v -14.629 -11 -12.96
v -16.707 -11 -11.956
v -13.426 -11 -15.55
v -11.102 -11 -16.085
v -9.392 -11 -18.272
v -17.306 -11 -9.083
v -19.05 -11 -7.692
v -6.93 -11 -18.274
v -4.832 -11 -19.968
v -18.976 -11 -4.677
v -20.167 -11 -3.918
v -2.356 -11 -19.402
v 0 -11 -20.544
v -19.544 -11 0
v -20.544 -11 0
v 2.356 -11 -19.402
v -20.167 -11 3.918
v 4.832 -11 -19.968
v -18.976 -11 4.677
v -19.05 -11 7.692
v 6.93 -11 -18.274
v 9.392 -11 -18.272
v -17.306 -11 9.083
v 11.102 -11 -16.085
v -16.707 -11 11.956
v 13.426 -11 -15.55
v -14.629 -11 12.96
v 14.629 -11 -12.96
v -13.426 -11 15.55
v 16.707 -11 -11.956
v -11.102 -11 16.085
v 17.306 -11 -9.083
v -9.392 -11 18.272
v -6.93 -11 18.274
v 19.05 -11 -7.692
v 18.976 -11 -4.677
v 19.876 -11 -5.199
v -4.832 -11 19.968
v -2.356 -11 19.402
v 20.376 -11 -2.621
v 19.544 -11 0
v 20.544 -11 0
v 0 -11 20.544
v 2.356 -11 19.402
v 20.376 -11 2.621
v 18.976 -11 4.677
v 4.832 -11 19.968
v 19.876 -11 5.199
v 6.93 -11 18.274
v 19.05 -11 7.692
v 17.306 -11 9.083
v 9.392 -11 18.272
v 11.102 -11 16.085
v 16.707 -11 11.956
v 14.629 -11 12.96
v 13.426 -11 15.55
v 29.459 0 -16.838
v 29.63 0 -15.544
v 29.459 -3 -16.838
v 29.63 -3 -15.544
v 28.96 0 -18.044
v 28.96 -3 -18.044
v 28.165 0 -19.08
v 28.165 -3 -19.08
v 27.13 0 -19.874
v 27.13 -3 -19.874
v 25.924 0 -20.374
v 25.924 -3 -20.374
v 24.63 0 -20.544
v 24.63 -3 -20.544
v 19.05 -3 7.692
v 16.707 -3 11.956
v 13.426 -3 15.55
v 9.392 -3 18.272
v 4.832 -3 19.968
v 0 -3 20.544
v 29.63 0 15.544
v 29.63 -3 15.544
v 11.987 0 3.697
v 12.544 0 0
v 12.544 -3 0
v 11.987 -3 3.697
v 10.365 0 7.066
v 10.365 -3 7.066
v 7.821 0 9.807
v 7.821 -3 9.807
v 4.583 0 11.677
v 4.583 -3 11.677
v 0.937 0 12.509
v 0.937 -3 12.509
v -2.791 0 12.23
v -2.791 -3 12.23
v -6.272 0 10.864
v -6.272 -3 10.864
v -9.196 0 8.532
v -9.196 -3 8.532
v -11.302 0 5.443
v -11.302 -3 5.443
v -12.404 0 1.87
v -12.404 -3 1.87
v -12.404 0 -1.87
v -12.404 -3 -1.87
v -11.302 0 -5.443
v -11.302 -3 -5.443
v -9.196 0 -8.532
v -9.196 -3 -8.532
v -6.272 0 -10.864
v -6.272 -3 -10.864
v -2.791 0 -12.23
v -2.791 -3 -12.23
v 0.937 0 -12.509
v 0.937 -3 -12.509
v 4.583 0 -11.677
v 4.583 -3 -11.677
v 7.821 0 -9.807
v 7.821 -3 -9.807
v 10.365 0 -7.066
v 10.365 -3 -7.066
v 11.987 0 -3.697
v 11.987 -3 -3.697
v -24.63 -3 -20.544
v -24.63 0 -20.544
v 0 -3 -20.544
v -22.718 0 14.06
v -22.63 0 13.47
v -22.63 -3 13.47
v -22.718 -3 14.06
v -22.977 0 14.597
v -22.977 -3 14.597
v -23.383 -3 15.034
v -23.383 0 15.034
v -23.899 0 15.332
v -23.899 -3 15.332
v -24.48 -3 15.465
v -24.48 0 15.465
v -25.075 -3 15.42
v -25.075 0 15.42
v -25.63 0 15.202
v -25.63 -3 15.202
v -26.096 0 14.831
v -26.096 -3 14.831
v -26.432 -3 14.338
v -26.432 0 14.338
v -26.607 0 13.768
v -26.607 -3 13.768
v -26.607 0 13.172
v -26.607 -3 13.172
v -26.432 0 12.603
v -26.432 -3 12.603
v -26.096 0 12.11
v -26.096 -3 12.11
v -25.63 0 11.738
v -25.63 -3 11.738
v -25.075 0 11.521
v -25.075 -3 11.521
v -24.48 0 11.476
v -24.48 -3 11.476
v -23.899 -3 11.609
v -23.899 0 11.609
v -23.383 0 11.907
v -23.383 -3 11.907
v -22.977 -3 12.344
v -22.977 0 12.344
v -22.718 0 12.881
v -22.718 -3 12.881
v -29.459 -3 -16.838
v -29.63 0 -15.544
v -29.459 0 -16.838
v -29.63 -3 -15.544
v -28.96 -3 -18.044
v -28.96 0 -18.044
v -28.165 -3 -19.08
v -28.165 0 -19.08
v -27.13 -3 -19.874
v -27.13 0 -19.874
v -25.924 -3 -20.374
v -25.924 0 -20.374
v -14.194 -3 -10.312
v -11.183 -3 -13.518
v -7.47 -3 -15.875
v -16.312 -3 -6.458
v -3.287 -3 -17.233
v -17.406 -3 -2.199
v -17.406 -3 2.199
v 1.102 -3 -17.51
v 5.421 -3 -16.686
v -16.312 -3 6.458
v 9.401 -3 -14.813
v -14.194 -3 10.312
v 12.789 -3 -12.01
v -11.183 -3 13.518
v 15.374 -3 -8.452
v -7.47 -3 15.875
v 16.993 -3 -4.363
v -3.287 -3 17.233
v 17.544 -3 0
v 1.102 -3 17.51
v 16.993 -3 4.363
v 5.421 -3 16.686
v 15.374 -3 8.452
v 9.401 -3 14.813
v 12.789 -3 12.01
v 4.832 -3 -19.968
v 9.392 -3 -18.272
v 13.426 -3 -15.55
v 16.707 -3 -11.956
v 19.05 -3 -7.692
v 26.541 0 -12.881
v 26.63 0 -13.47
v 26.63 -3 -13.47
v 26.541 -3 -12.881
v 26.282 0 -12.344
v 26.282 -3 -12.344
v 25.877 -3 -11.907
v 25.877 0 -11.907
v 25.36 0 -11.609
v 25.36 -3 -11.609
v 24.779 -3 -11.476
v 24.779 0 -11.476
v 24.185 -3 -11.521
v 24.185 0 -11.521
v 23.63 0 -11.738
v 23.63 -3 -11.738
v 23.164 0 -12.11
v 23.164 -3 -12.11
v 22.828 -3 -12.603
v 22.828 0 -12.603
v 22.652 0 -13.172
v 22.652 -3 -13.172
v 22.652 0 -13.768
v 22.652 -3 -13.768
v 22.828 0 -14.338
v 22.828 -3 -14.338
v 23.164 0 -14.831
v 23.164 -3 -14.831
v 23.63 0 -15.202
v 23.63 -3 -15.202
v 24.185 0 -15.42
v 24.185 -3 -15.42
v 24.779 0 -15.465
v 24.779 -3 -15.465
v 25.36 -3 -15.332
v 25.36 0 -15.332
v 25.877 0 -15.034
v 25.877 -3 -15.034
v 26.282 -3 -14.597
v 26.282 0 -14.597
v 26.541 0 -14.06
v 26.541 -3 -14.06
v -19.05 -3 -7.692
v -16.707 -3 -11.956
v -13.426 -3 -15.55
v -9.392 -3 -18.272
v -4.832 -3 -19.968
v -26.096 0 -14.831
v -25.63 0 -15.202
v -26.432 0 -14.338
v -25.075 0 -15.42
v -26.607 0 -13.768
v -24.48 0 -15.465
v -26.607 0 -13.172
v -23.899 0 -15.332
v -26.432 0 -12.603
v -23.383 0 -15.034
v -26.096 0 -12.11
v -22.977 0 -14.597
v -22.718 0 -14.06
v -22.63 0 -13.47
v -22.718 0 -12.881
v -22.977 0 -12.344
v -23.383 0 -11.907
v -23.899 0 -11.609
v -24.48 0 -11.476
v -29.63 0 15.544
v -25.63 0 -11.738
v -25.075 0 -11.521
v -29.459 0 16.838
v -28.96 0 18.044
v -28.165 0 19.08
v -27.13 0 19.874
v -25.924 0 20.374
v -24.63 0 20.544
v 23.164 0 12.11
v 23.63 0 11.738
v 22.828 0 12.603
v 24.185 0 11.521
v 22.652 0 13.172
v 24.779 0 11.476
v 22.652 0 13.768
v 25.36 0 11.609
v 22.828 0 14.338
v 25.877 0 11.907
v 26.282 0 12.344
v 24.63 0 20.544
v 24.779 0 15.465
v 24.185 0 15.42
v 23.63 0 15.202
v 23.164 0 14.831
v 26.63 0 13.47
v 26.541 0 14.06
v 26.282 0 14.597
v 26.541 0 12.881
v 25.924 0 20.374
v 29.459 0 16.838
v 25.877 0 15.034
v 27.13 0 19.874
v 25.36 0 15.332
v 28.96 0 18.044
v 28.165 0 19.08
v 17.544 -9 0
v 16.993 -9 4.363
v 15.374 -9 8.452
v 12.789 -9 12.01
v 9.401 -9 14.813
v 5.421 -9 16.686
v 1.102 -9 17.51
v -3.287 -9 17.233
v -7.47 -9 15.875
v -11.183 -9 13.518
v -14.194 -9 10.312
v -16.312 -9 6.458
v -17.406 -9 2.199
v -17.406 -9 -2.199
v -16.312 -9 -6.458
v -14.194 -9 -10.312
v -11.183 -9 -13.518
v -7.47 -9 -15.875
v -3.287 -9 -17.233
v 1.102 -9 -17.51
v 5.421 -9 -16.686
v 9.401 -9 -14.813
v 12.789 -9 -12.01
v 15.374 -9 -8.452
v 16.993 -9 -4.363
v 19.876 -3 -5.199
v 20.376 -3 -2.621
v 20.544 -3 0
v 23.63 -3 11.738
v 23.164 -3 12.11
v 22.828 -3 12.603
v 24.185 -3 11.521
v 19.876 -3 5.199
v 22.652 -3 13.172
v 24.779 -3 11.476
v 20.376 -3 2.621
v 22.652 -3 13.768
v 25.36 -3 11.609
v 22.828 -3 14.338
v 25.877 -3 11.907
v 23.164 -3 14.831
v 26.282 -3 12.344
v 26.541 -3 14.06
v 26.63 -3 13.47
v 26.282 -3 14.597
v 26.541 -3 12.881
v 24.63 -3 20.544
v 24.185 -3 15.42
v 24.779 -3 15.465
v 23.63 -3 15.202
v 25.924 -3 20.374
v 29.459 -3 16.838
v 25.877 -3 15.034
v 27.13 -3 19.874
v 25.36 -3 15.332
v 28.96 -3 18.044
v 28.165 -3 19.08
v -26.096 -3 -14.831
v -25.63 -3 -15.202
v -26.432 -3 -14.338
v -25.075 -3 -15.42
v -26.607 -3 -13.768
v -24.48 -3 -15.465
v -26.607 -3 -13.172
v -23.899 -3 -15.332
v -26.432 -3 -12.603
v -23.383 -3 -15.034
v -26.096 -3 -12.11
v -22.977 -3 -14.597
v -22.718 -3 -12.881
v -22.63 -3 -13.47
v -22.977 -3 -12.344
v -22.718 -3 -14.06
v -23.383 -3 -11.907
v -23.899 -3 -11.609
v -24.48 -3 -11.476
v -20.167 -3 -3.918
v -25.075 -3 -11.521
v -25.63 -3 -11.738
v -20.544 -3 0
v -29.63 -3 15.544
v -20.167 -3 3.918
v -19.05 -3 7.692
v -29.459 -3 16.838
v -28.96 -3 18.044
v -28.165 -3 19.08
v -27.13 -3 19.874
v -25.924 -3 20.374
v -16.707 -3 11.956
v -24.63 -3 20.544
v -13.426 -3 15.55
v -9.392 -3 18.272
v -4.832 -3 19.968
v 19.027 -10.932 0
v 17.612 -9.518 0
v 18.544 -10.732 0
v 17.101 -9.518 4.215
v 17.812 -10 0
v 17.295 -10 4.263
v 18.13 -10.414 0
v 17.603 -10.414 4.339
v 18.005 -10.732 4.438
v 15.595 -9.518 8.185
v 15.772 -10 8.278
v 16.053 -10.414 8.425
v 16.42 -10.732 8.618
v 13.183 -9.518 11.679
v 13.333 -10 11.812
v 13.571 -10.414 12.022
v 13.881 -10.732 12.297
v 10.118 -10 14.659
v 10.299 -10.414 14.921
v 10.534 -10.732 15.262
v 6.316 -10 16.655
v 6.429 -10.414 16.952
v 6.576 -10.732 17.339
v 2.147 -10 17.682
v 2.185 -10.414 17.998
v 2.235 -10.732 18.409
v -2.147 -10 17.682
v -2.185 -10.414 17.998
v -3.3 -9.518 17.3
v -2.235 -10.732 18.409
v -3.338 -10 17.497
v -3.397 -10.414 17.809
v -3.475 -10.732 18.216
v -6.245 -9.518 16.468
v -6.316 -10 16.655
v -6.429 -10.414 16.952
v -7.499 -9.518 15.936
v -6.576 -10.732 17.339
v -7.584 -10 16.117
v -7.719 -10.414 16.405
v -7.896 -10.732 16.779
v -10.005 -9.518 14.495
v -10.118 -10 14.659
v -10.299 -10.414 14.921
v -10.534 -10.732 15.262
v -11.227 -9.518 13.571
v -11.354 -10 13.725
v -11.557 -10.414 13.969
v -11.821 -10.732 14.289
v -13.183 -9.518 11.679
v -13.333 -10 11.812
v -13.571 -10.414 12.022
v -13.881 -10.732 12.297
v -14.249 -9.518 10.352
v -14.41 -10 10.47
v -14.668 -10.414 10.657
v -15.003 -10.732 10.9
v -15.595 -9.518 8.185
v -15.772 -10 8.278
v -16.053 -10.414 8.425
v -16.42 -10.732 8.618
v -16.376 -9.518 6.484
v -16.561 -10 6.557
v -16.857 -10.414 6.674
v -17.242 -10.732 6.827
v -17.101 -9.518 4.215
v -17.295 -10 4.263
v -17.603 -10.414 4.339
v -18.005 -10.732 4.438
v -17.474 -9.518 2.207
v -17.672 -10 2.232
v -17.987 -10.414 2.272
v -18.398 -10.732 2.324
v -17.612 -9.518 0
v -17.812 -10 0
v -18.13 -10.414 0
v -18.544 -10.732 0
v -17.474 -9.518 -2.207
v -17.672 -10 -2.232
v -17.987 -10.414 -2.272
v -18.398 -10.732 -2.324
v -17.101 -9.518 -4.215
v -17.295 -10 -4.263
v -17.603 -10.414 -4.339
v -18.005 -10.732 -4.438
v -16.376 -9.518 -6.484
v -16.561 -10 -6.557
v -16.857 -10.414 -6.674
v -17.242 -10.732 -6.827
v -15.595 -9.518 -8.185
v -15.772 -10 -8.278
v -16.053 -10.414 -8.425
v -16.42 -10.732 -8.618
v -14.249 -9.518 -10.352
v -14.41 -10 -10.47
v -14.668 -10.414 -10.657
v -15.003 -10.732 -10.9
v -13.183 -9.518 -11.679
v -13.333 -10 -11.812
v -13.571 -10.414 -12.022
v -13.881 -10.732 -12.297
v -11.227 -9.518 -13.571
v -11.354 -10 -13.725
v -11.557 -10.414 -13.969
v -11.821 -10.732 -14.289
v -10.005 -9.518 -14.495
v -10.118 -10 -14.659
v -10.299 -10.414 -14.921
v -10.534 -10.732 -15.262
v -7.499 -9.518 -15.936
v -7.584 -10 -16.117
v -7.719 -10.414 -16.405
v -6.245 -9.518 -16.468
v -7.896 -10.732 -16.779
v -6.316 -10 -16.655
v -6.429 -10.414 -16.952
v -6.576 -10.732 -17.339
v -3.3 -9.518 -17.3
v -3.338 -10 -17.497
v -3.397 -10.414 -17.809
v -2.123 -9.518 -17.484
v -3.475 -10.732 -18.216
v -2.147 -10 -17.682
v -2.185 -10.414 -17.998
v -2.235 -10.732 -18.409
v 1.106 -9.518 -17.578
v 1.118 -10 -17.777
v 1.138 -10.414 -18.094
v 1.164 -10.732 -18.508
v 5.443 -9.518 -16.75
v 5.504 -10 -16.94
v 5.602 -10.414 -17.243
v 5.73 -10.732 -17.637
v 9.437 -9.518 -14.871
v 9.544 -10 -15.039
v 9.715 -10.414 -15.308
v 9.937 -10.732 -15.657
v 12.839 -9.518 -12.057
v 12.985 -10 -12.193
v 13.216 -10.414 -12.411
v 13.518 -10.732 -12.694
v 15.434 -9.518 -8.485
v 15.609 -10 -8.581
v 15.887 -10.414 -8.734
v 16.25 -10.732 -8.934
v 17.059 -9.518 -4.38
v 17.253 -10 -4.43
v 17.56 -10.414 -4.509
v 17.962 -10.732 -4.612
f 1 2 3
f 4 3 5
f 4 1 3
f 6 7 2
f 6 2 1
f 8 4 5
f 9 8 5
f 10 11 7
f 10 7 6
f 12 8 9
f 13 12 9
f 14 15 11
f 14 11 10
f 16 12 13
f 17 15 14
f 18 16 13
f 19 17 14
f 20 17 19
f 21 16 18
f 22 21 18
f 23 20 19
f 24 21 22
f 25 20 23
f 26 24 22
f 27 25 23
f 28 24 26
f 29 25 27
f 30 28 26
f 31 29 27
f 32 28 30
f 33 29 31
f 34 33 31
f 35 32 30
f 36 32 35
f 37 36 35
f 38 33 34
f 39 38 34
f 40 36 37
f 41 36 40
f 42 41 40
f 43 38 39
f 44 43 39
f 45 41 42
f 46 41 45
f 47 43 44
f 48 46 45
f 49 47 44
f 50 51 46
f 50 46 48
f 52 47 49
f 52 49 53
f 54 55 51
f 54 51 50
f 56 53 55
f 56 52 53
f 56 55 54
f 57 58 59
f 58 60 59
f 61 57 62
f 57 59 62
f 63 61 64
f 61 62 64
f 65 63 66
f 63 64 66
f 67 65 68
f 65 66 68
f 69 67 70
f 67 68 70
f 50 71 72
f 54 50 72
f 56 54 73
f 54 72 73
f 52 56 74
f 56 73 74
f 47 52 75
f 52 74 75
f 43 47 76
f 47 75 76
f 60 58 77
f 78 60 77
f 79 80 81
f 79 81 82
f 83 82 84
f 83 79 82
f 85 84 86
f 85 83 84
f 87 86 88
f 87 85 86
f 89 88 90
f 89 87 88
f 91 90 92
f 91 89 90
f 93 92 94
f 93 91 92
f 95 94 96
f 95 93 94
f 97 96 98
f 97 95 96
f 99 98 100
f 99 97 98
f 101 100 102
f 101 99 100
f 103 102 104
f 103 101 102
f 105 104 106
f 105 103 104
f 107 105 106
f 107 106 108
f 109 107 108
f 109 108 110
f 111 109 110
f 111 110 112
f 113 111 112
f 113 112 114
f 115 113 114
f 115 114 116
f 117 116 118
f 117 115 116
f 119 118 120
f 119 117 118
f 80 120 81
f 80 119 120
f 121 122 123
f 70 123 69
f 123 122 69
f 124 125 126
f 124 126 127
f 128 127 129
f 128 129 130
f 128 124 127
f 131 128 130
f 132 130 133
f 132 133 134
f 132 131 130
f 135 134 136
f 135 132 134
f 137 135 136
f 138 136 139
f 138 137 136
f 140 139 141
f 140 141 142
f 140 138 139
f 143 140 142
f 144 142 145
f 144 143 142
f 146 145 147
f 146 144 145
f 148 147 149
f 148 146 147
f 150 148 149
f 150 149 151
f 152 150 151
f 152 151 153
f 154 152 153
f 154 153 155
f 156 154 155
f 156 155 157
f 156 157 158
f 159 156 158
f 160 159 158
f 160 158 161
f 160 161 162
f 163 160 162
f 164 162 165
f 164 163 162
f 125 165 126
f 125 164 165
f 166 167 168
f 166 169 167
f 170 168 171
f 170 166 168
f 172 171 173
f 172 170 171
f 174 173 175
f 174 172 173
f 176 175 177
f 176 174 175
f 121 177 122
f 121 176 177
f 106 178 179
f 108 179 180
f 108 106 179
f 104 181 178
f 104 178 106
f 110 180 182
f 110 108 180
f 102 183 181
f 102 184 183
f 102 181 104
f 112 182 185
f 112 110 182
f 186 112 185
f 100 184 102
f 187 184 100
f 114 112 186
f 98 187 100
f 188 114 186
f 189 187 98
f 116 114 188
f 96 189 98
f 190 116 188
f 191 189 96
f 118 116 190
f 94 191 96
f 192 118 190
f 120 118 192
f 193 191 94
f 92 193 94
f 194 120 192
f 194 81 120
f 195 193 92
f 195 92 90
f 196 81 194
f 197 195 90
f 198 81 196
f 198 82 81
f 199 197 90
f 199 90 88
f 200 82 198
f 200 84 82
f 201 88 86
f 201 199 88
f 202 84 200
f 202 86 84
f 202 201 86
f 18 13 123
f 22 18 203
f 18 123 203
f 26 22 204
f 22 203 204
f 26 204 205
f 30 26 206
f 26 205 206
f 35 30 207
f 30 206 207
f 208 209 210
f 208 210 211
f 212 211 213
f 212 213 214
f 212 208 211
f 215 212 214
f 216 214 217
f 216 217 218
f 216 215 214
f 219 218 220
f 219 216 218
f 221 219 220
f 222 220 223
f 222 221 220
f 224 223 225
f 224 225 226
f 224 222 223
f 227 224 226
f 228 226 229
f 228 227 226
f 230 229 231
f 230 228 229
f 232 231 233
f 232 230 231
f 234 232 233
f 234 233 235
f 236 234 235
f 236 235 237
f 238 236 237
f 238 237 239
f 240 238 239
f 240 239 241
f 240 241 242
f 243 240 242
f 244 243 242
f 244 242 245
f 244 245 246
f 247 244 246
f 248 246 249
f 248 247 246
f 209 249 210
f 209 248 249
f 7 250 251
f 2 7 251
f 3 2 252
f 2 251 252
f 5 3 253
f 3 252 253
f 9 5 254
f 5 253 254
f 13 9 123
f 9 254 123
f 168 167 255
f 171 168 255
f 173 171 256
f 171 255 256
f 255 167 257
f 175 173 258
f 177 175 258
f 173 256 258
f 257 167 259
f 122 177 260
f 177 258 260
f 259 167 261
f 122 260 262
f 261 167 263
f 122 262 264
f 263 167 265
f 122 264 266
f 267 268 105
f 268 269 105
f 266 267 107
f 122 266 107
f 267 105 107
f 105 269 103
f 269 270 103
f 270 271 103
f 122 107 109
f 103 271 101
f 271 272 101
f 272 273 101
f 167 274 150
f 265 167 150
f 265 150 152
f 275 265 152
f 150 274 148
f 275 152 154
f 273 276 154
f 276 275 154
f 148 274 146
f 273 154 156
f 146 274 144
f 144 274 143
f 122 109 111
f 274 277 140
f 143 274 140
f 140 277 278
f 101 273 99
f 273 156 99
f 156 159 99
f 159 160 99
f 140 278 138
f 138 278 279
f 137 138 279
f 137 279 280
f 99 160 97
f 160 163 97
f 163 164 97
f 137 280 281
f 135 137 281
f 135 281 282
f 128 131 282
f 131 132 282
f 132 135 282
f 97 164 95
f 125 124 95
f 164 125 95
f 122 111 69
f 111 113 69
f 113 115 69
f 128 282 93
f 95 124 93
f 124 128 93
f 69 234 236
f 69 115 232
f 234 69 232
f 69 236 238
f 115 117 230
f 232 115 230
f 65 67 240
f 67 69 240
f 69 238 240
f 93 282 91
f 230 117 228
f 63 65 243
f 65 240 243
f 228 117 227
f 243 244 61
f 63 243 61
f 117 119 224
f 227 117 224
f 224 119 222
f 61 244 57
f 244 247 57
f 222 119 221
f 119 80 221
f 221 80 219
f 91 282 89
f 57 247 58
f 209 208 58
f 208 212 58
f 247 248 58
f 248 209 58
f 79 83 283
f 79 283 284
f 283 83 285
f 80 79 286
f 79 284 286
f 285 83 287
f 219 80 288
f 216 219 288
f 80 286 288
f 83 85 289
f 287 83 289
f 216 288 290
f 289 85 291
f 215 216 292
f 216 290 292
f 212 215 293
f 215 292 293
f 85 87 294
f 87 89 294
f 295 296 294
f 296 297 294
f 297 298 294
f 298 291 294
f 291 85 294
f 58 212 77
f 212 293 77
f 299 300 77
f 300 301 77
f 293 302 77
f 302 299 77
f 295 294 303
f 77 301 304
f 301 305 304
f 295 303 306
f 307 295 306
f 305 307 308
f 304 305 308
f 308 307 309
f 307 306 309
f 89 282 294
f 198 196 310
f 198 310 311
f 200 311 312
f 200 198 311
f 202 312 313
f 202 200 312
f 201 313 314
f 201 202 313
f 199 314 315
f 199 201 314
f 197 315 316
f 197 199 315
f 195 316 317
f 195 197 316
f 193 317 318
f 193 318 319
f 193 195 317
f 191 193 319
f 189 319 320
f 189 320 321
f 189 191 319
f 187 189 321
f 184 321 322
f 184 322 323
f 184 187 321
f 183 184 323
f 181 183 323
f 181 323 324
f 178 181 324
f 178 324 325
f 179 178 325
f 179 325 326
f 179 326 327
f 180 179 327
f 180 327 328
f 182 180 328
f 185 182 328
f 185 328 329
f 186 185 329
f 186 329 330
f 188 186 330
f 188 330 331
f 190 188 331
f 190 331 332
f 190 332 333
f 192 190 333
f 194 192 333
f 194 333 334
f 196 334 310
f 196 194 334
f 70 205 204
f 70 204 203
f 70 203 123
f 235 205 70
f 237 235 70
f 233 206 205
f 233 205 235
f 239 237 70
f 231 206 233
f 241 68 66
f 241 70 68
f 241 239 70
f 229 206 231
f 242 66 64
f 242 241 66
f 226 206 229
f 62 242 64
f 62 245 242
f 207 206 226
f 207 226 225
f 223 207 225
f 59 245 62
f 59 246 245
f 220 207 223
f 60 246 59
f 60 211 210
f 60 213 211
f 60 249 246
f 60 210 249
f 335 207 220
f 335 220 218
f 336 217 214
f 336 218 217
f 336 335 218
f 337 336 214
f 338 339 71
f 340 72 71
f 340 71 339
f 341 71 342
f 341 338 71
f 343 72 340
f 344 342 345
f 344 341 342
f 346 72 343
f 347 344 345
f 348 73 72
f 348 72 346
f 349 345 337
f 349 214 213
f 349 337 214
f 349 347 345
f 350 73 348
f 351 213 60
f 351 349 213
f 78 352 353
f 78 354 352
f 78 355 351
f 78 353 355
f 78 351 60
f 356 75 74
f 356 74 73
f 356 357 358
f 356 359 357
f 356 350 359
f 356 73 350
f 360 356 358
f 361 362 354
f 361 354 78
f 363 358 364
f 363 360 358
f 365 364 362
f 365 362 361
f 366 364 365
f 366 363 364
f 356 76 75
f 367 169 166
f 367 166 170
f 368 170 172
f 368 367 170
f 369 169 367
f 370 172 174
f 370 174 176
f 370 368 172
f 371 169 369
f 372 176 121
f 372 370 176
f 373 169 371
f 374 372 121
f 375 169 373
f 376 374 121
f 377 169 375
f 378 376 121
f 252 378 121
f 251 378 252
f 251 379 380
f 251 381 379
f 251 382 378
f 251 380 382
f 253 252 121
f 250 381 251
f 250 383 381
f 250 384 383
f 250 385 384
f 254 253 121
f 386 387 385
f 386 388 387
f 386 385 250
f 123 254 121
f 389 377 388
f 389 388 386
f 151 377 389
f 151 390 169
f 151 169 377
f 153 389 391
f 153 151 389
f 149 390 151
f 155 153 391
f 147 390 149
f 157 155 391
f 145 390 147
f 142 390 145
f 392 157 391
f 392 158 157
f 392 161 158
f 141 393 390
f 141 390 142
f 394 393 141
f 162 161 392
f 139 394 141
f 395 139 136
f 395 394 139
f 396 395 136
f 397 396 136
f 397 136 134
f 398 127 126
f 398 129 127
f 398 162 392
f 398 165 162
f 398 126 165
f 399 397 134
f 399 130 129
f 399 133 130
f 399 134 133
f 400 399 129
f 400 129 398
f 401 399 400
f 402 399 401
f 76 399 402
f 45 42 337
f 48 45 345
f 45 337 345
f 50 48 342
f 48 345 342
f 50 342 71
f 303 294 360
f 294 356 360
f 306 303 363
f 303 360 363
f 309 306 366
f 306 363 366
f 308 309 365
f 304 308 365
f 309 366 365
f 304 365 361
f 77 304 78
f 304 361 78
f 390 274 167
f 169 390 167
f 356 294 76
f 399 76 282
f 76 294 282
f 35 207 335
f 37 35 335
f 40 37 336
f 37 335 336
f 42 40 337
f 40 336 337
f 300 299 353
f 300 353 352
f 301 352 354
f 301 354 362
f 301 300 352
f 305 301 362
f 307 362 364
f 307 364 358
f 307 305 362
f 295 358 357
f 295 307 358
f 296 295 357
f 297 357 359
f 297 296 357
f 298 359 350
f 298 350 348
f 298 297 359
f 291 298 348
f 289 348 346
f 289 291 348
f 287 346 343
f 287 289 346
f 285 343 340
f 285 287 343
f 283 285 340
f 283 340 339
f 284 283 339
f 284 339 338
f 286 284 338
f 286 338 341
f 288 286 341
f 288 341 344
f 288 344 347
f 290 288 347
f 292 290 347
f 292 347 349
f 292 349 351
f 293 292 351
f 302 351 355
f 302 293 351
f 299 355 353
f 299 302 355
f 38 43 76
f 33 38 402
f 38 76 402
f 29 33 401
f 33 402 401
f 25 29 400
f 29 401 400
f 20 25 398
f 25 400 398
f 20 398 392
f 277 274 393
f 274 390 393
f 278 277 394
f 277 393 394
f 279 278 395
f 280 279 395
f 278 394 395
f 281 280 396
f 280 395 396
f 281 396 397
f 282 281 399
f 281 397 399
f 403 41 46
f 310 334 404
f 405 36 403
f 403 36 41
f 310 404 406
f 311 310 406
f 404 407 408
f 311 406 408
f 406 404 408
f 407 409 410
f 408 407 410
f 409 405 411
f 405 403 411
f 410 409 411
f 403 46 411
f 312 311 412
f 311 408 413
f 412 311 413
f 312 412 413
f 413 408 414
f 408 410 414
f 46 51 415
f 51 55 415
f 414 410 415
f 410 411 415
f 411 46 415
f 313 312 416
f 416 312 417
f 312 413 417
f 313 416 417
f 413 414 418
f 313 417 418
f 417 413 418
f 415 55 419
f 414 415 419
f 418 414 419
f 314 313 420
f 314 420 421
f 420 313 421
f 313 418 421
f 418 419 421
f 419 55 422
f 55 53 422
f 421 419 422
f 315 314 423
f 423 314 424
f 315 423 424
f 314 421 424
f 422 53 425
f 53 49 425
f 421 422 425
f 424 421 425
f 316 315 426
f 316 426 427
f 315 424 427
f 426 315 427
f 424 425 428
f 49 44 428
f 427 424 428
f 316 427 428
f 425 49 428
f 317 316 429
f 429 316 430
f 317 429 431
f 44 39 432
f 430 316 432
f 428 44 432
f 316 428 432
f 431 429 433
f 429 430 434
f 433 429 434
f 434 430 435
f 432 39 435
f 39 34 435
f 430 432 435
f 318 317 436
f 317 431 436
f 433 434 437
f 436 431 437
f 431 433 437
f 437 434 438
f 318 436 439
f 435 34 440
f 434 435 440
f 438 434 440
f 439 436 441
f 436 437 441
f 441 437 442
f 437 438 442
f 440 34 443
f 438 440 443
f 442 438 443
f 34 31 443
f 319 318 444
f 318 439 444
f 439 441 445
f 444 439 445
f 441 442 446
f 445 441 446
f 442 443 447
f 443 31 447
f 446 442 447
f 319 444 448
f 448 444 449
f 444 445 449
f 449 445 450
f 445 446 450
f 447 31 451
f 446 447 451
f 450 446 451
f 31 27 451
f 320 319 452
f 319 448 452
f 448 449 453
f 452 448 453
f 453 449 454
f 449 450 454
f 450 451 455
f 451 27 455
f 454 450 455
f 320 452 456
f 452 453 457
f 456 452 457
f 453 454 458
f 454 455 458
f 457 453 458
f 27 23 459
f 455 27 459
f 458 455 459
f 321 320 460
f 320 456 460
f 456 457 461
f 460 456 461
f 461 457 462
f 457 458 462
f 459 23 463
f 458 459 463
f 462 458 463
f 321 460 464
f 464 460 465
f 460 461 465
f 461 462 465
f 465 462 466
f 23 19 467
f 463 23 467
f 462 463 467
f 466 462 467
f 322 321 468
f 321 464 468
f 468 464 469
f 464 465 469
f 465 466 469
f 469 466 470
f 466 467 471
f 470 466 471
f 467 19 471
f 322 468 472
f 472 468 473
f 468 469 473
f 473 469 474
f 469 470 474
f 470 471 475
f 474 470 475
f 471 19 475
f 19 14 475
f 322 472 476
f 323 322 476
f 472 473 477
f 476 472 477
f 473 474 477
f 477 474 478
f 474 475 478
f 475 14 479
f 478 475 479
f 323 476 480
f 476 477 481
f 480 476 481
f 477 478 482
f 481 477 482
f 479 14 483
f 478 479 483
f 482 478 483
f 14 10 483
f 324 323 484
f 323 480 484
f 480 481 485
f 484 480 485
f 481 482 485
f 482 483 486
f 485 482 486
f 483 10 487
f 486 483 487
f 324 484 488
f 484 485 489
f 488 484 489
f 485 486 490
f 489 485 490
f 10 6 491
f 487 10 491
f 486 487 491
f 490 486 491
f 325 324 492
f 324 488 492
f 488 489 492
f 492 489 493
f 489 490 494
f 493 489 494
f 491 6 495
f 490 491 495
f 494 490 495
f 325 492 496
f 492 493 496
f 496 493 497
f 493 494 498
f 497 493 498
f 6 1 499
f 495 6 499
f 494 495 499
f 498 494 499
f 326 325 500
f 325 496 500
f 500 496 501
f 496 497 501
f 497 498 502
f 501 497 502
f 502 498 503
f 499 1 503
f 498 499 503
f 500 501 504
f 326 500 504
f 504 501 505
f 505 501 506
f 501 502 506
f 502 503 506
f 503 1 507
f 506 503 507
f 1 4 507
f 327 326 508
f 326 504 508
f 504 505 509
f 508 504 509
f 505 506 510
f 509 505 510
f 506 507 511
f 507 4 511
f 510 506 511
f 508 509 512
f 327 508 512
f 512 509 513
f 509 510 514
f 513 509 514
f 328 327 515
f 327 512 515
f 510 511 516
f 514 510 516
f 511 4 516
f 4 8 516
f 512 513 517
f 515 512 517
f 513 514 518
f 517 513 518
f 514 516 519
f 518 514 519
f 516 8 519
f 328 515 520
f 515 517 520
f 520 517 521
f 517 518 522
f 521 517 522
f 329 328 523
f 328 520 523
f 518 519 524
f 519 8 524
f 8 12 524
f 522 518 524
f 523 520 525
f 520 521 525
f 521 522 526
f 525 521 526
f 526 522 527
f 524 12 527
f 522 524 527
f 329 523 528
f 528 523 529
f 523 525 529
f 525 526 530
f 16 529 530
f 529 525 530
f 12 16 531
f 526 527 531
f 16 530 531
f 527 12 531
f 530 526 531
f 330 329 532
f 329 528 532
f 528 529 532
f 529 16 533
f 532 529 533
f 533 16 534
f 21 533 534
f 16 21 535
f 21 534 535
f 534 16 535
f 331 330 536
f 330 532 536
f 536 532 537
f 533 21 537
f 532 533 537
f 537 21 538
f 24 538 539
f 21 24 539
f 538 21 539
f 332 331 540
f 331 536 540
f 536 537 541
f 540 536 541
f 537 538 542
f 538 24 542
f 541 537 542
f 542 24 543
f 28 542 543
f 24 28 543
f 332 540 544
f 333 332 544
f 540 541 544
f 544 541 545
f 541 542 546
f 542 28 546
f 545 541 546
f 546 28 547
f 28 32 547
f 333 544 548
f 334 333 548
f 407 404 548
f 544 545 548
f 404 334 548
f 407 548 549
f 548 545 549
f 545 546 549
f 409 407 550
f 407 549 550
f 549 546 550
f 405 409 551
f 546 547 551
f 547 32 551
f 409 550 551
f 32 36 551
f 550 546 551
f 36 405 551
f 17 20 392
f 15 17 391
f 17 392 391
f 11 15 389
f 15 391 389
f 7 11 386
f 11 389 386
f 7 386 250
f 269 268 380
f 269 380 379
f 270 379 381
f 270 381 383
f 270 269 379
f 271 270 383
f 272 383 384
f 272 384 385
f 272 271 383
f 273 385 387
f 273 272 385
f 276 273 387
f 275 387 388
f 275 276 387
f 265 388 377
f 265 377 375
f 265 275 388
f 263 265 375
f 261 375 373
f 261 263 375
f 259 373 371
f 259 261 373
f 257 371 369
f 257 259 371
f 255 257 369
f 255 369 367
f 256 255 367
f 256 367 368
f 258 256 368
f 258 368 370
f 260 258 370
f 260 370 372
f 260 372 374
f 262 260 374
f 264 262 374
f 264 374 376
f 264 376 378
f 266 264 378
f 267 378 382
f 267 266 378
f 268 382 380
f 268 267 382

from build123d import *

# Parameters (mm, degrees)
F0_R     = 17.54425
F0_R_2   = 2
F1_DEPTH = 3
F0_R_3   = 12.54425
F2_DEPTH = 3
F3_DEPTH = 11
F4_R     = 5
F5_R     = 2


with BuildPart() as f1:
    # F0 (on Front) → F1 (new body)
    with BuildSketch(Plane.XZ):
        with BuildLine():
            ThreePointArc((19.05, 7.6917948531), (11.4900838041, 17.0306835517), (0, 20.54425))
            ThreePointArc((0, 20.54425), (-11.4900838041, 17.0306835517), (-19.05, 7.6917948531))
            Line((-19.05, 7.6917948531), (-19.05, -7.6917948531))
            ThreePointArc((-19.05, -7.6917948531), (-11.4900838386, -17.0306835284), (-8.31e-08, -20.54425))
            ThreePointArc((-8.31e-08, -20.54425), (11.4900837697, -17.0306835749), (19.05, -7.6917948531))
            Line((19.05, -7.6917948531), (19.05, 7.6917948531))
        make_face()
        Circle(F0_R, mode=Mode.SUBTRACT)
        with BuildLine():
            Line((29.6296158184, 20.54425), (19.05, 20.54425))
            Line((19.05, 20.54425), (19.05, 7.6917948531))
            ThreePointArc((19.05, 7.6917948531), (20.1672280019, 3.9177956533), (20.54425, 0))
            ThreePointArc((20.54425, 0), (20.1672280019, -3.9177956533), (19.05, -7.6917948531))
            Line((19.05, -7.6917948531), (19.05, -20.54425))
            Line((19.05, -20.54425), (29.6296158184, -20.54425))
            Line((29.6296158184, -20.54425), (29.6296158184, 20.54425))
        make_face()
        with Locations((24.6296158184, -13.4703841816)):
            Circle(F0_R_2, mode=Mode.SUBTRACT)
        with Locations((24.6296158184, 13.4703841816)):
            Circle(F0_R_2, mode=Mode.SUBTRACT)
        with BuildLine():
            Line((-19.05, 7.6917948531), (-19.05, 20.54425))
            Line((-19.05, 20.54425), (-29.6296158184, 20.54425))
            Line((-29.6296158184, 20.54425), (-29.6296158184, -20.54425))
            Line((-29.6296158184, -20.54425), (-19.05, -20.54425))
            Line((-19.05, -20.54425), (-19.05, -7.6917948531))
            ThreePointArc((-19.05, -7.6917948531), (-20.54425, 0), (-19.05, 7.6917948531))
        make_face()
        with Locations((-24.6296158184, -13.4703841816)):
            Circle(F0_R_2, mode=Mode.SUBTRACT)
        with Locations((-24.6296158184, 13.4703841816)):
            Circle(F0_R_2, mode=Mode.SUBTRACT)
        with BuildLine():
            Line((0, 20.54425), (-19.05, 20.54425))
            Line((-19.05, 20.54425), (-19.05, 7.6917948531))
            ThreePointArc((-19.05, 7.6917948531), (-11.4900838041, 17.0306835517), (0, 20.54425))
        make_face()
        with BuildLine():
            Line((-19.05, -7.6917948531), (-19.05, 7.6917948531))
            ThreePointArc((-19.05, 7.6917948531), (-20.54425, 0), (-19.05, -7.6917948531))
        make_face()
        with BuildLine():
            ThreePointArc((20.54425, 0), (20.1672280019, 3.9177956533), (19.05, 7.6917948531))
            Line((19.05, 7.6917948531), (19.05, -7.6917948531))
            ThreePointArc((19.05, -7.6917948531), (20.1672280019, -3.9177956533), (20.54425, 0))
        make_face()
        with BuildLine():
            Line((19.05, 20.54425), (0, 20.54425))
            ThreePointArc((0, 20.54425), (11.4900838041, 17.0306835517), (19.05, 7.6917948531))
            Line((19.05, 7.6917948531), (19.05, 20.54425))
        make_face()
        with BuildLine():
            Line((19.05, -20.54425), (19.05, -7.6917948531))
            ThreePointArc((19.05, -7.6917948531), (11.4900837697, -17.0306835749), (-8.31e-08, -20.54425))
            Line((-8.31e-08, -20.54425), (19.05, -20.54425))
        make_face()
        with BuildLine():
            ThreePointArc((-8.31e-08, -20.54425), (-11.4900838386, -17.0306835284), (-19.05, -7.6917948531))
            Line((-19.05, -7.6917948531), (-19.05, -20.54425))
            Line((-19.05, -20.54425), (-8.31e-08, -20.54425))
        make_face()
    extrude(amount=F1_DEPTH)

    # F0 (on Front) → F2 (join)
    with BuildSketch(Plane.XZ):
        Circle(F0_R)
        Circle(F0_R_3, mode=Mode.SUBTRACT)
    extrude(amount=F2_DEPTH)

    # F0 (on Front) → F3 (join)
    with BuildSketch(Plane.XZ):
        with BuildLine():
            ThreePointArc((19.05, 7.6917948531), (11.4900838041, 17.0306835517), (0, 20.54425))
            ThreePointArc((0, 20.54425), (-11.4900838041, 17.0306835517), (-19.05, 7.6917948531))
            Line((-19.05, 7.6917948531), (-19.05, -7.6917948531))
            ThreePointArc((-19.05, -7.6917948531), (-11.4900838386, -17.0306835284), (-8.31e-08, -20.54425))
            ThreePointArc((-8.31e-08, -20.54425), (11.4900837697, -17.0306835749), (19.05, -7.6917948531))
            Line((19.05, -7.6917948531), (19.05, 7.6917948531))
        make_face()
        Circle(F0_R, mode=Mode.SUBTRACT)
        with BuildLine():
            Line((-19.05, -7.6917948531), (-19.05, 7.6917948531))
            ThreePointArc((-19.05, 7.6917948531), (-20.54425, 0), (-19.05, -7.6917948531))
        make_face()
        with BuildLine():
            ThreePointArc((20.54425, 0), (20.1672280019, 3.9177956533), (19.05, 7.6917948531))
            Line((19.05, 7.6917948531), (19.05, -7.6917948531))
            ThreePointArc((19.05, -7.6917948531), (20.1672280019, -3.9177956533), (20.54425, 0))
        make_face()
    extrude(amount=F3_DEPTH)

    # F4
    f4_edges = [f1.edges().sort_by_distance(p)[0] for p in [
        (-29.629616, -1.5, 20.54425),
        (-29.629616, -1.5, -20.54425),
        (29.629616, -1.5, -20.54425),
        (29.629616, -1.5, 20.54425),
    ]]
    fillet(f4_edges, radius=F4_R)

    # F5
    f5_edges = [f1.edges().sort_by_distance(p)[0] for p in [
        (-17.54425, -11, 0),
    ]]
    fillet(f5_edges, radius=F5_R)


solid = f1.part
